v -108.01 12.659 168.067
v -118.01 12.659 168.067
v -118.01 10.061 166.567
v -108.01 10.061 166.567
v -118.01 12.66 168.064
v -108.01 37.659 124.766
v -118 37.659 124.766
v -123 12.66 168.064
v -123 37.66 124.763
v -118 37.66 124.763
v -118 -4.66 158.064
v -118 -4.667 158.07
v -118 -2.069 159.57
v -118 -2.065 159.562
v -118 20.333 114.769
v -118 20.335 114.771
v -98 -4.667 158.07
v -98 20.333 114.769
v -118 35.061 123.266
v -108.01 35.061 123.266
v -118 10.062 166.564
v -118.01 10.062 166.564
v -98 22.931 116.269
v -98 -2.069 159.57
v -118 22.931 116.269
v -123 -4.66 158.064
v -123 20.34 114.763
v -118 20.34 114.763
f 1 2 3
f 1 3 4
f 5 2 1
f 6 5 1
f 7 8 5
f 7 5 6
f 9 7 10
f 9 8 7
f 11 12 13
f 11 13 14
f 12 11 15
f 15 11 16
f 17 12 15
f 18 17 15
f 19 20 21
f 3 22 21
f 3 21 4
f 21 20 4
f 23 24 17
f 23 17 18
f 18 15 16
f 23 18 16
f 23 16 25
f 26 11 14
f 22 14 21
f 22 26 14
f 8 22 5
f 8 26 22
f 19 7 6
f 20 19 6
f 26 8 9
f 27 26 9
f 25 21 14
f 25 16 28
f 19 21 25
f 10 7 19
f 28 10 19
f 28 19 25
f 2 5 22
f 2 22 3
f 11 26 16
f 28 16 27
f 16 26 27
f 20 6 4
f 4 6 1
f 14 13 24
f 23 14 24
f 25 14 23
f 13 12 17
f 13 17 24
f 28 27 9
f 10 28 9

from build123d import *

# Parameters (mm, degrees)
SKETCH063_W             = 50
SKETCH063_H             = 20
PAD062_DEPTH            = 5
SKETCH064_W             = 50
SKETCH064_H             = 3
PAD063_DEPTH            = 20
SKETCH065_W             = 50
SKETCH065_H             = 10
PAD064_DEPTH            = 3
BODY045_ROLL_ANGLE      = 90
BODY045_PITCH_ANGLE     = 60
BODY045_PLACEMENT_ANGLE = 90


with BuildPart() as part:
    # Sketch063 → Pad062 (new body)
    with BuildSketch(Plane.XY):
        with Locations((184.845276, -123.914059)):
            Rectangle(SKETCH063_W, SKETCH063_H)
    extrude(amount=PAD062_DEPTH)

    # Sketch064 (on Face6 of Pad062) → Pad063 (join)
    with BuildSketch(Plane.XY.offset(5)):
        with Locations((184.83606, -132.417099)):
            Rectangle(SKETCH064_W, SKETCH064_H)
    extrude(amount=PAD063_DEPTH)

    # Sketch065 (on Face7 of Pad063) → Pad064 (join)
    with BuildSketch(Plane(origin=(0, -113.914059, 0), x_dir=(-1, 0, 0), z_dir=(0, 1, 0))):
        with Locations((-184.841869, 9.989668)):
            Rectangle(SKETCH065_W, SKETCH065_H)
    extrude(amount=-PAD064_DEPTH)


with BuildPart() as part_1:
    # Body045 roll: moved
    add(part.part.rotate(Axis((0, 0, 0), (1, 0, 0)), BODY045_ROLL_ANGLE))


with BuildPart() as part_2:
    # Body045 pitch: moved
    add(part_1.part.rotate(Axis((0, 0, 0), (0, 1, 0)), BODY045_PITCH_ANGLE))


with BuildPart() as part_3:
    # Body045 placement: moved
    add(part_2.part.moved(Location((-123, 31.390183, 363.451047))).rotate(Axis((-123, 31.390183, 363.451047), (0, 0, 1)), BODY045_PLACEMENT_ANGLE))


solid = part_3.part
